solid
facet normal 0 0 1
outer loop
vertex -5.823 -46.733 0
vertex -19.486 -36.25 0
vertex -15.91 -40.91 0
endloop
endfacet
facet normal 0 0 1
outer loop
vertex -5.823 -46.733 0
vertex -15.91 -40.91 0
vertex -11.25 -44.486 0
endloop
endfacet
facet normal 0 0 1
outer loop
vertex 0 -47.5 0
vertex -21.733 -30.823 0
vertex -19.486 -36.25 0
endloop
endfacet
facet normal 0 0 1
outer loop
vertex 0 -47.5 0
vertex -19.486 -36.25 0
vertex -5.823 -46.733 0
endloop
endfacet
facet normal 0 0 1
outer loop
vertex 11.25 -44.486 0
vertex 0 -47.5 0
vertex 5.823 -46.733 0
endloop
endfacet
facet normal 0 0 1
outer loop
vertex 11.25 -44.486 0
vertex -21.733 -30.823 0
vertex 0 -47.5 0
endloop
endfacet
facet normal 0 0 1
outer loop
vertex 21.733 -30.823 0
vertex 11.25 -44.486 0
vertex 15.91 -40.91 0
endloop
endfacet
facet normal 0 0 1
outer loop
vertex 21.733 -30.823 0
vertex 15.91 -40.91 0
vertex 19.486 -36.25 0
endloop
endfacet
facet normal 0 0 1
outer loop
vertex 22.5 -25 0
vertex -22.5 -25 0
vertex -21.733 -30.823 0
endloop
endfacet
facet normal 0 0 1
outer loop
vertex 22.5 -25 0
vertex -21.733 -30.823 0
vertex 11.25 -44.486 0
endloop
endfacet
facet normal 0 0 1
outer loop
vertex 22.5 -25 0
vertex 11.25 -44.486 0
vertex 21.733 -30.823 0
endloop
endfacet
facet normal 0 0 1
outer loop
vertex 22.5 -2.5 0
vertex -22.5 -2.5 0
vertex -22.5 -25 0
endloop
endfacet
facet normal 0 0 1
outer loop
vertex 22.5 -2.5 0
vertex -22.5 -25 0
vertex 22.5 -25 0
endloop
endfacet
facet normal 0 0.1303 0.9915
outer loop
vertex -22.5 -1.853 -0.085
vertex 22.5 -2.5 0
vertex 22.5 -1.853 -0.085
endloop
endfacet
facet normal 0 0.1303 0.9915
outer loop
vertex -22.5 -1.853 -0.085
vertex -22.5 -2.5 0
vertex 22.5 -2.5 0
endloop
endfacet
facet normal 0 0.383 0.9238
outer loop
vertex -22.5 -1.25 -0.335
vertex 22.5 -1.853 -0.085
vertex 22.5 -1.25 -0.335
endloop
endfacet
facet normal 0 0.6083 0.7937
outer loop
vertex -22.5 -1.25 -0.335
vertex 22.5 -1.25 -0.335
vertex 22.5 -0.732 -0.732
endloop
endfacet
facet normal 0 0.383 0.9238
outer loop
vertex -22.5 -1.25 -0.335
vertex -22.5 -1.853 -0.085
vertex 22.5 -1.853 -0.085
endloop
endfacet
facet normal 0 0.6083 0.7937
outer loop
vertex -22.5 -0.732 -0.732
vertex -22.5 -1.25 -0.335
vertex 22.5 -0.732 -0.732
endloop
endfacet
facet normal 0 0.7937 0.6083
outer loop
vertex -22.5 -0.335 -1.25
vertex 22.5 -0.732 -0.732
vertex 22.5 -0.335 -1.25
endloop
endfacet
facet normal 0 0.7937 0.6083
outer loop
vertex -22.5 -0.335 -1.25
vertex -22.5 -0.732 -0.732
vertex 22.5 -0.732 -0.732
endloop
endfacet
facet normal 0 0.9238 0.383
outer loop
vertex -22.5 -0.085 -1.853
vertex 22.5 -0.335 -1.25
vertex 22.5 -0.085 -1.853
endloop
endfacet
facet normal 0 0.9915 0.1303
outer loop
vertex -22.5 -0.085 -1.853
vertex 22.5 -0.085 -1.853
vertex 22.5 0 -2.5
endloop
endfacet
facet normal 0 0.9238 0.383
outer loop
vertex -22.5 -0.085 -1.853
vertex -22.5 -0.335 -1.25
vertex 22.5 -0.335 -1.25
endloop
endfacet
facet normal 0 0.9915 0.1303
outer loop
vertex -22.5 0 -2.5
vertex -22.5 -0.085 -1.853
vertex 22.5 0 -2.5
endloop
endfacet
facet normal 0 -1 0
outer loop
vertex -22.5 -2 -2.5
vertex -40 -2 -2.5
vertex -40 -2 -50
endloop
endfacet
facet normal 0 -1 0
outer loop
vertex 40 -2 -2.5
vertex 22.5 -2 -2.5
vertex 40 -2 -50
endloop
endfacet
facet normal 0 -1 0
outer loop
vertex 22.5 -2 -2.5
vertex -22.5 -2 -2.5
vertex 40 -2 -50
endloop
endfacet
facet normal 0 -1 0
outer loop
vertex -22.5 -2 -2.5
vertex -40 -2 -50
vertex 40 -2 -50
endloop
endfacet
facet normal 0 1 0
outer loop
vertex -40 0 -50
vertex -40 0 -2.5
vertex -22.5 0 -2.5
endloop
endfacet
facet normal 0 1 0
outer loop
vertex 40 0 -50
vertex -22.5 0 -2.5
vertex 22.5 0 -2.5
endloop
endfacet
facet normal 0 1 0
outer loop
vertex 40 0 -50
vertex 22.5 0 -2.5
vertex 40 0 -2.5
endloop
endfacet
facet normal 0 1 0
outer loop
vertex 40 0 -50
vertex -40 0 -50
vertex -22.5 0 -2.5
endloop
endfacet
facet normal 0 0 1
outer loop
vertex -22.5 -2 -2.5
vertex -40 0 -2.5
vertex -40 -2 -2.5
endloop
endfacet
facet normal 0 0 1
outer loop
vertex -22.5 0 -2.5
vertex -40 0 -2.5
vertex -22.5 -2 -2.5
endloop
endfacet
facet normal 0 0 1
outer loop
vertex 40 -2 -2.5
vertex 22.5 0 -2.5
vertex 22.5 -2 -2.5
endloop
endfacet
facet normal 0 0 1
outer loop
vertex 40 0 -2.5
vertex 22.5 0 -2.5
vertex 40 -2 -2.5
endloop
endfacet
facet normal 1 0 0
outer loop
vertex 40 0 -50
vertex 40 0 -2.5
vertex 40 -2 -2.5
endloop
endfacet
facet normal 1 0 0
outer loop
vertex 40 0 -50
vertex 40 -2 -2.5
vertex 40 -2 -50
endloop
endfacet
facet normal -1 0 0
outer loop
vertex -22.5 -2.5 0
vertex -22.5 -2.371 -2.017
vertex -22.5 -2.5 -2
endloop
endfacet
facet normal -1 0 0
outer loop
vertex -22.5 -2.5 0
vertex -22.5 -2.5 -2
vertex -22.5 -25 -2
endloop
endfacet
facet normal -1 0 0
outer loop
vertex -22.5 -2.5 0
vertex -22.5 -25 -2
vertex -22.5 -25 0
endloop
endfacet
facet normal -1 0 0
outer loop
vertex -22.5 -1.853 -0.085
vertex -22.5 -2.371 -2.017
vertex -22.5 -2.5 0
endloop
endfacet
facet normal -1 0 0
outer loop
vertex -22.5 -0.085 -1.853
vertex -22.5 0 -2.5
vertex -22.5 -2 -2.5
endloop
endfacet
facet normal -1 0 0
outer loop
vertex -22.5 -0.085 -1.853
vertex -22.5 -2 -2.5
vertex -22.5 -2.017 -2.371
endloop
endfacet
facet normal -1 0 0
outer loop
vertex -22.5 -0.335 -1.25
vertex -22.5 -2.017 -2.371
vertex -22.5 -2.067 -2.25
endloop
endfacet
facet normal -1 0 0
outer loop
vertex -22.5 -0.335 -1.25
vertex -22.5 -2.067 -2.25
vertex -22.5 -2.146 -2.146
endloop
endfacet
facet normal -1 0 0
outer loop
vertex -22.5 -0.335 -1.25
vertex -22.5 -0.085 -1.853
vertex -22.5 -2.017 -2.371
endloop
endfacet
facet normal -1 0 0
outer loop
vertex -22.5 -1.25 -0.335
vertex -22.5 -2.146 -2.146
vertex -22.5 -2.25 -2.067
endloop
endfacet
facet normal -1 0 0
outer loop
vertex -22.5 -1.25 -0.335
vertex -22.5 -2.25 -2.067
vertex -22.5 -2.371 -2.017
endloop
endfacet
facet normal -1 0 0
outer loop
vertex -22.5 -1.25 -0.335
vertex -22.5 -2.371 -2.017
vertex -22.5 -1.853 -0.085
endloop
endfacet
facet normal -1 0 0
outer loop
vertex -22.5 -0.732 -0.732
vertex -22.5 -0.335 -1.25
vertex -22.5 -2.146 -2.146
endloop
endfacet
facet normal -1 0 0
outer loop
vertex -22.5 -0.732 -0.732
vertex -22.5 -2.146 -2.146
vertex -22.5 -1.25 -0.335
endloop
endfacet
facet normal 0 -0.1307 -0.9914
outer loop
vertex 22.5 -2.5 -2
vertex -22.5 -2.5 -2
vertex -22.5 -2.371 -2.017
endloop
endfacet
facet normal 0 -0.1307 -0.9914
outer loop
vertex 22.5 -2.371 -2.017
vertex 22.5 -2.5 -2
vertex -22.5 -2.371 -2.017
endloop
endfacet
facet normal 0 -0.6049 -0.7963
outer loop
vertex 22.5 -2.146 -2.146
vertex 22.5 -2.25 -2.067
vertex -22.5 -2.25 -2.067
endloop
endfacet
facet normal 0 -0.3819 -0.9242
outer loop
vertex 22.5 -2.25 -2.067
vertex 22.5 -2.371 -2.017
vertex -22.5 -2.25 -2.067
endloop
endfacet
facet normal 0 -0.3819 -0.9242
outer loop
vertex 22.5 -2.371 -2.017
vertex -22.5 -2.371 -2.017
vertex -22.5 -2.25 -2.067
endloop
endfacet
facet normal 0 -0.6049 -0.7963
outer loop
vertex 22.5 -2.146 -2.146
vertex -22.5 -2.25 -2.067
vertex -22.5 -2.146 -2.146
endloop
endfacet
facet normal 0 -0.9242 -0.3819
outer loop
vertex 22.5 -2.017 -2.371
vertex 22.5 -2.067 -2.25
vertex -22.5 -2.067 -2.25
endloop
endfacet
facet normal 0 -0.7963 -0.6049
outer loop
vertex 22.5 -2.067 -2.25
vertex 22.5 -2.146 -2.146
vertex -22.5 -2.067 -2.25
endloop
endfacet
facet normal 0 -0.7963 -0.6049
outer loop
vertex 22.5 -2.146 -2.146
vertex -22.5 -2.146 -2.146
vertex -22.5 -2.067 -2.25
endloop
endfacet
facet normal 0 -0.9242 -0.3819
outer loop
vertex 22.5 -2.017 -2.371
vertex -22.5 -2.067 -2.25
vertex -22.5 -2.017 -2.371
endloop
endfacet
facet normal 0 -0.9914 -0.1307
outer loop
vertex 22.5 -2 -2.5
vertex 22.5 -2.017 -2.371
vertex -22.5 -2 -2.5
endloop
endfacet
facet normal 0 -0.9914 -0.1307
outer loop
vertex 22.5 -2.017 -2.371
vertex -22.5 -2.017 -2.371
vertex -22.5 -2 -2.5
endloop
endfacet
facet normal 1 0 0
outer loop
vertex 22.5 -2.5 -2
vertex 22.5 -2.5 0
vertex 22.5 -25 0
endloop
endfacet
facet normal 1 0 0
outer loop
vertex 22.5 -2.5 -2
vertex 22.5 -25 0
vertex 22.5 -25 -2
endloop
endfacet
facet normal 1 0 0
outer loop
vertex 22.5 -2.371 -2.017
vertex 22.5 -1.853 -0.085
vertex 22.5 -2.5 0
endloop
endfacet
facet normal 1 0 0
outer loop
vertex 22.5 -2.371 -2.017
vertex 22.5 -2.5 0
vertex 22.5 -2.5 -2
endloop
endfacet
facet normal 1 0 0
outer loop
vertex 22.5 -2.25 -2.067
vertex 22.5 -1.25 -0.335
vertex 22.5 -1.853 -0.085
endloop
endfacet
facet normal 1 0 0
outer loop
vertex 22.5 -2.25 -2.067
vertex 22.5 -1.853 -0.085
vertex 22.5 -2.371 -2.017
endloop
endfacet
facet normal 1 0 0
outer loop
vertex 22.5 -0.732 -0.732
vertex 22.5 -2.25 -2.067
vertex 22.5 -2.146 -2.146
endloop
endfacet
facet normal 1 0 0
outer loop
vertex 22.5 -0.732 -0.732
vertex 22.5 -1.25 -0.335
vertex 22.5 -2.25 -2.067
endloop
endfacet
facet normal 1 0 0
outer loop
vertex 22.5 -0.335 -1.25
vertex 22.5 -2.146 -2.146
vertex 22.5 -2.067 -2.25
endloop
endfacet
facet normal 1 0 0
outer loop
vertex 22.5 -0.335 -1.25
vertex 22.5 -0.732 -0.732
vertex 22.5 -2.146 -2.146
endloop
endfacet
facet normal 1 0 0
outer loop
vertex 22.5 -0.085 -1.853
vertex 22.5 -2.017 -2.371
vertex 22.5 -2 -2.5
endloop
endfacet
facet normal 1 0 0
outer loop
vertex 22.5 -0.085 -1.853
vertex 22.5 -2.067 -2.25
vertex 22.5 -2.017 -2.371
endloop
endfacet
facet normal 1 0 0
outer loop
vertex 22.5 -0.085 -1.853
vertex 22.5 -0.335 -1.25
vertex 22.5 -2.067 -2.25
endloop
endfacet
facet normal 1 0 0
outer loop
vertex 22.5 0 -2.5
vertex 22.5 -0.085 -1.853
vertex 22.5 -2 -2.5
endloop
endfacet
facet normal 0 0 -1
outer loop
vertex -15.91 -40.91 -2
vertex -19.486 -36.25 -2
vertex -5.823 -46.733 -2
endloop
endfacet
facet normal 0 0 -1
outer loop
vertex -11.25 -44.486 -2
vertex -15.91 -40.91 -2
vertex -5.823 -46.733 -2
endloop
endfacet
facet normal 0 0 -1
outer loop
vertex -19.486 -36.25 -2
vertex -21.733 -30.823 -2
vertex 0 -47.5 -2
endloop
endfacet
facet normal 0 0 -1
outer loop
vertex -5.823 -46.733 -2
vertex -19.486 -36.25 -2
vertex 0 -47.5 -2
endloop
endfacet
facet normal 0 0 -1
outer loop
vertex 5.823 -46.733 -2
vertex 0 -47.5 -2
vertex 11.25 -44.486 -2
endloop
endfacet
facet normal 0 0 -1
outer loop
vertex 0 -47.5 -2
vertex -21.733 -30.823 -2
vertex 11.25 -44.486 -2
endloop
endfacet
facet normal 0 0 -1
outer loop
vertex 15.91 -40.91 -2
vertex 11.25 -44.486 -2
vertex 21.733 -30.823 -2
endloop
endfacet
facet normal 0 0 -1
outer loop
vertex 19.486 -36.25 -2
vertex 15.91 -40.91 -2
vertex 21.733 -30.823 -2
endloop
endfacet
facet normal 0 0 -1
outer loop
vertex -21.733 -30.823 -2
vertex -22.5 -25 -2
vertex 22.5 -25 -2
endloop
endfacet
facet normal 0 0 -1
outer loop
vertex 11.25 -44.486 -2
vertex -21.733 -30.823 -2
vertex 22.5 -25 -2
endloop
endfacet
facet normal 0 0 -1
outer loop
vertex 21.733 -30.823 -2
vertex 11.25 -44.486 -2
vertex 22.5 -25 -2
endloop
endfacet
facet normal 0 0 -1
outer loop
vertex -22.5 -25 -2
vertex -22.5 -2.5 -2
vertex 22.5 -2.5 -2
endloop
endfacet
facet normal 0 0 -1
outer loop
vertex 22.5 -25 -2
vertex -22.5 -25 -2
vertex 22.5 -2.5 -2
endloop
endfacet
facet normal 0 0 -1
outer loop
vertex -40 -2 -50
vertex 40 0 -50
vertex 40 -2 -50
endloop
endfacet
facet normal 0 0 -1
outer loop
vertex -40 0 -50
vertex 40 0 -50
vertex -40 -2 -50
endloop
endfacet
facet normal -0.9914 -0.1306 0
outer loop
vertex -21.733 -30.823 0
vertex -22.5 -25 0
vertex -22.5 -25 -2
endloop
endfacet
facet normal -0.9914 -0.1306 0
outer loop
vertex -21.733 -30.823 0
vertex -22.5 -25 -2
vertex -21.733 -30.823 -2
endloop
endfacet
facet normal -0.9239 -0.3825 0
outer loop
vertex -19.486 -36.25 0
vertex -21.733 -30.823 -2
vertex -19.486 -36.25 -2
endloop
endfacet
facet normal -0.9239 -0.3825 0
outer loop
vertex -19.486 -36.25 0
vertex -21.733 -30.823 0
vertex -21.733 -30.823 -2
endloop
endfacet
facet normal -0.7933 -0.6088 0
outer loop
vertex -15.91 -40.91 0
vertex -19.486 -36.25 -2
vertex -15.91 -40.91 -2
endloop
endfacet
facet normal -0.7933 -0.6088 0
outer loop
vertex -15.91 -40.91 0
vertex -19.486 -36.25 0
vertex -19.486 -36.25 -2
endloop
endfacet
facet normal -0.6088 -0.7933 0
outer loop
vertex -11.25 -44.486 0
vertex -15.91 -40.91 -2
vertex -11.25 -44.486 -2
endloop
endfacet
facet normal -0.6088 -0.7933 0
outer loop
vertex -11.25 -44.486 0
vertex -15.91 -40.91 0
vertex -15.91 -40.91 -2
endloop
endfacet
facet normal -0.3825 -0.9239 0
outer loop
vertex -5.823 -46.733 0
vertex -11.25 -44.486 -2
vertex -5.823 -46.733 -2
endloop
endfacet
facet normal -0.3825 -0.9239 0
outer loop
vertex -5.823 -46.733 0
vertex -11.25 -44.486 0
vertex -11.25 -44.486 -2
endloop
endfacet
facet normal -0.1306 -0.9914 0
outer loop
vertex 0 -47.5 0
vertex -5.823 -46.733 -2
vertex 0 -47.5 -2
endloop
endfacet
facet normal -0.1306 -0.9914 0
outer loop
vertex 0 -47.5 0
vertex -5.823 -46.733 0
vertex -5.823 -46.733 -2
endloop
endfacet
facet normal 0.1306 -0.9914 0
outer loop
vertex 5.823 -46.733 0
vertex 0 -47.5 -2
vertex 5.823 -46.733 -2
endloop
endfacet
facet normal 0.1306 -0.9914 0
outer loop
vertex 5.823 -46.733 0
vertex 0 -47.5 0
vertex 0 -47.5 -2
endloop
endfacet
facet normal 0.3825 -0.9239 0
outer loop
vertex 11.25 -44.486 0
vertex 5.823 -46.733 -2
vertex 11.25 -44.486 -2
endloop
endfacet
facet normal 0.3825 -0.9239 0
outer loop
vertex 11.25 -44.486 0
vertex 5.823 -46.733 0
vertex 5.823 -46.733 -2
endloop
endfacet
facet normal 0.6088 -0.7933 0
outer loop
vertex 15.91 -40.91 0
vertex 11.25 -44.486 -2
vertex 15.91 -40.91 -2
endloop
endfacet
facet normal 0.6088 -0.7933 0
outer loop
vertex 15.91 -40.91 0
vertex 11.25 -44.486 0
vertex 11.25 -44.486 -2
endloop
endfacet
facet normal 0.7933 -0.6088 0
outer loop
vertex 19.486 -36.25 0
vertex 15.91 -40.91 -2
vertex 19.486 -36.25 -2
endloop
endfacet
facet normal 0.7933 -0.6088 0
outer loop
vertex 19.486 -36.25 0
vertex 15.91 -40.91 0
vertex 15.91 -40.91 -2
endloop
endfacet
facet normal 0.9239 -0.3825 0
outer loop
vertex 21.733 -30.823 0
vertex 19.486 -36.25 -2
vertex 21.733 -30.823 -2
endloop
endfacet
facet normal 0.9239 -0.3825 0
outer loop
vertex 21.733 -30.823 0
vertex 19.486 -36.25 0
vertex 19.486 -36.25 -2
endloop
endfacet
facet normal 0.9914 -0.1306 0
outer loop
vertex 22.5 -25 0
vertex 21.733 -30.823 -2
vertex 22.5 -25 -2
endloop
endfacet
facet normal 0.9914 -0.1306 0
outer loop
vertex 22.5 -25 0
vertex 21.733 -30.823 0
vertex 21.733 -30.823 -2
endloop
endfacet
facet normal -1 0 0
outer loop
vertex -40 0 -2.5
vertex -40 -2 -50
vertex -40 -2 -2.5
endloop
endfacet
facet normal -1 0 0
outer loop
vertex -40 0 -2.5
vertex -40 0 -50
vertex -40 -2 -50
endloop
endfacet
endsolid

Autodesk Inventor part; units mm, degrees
ref_plane "Work Plane1" through (0, -25, -17) normal (0, 0, 1) x (1, 0, 0)
ref_plane "YZ Plane" through (0, 0, 0) normal (1, 0, 0) x (0, 1, 0)
ref_plane "XZ Plane" through (0, 0, 0) normal (0, 1, 0) x (-1, 0, 0)
sketch "Sketch2" plane through (0, 0, 0) normal (0, 1, 0) x (-1, 0, 0)
  line L0 (22.5, 0) -> (-22.5, 0)
  line L1 (-22.5, 0) -> (-22.5, -50)
  line L2 (-22.5, -50) -> (22.5, -50)
  line L3 (22.5, -50) -> (22.5, 0)
  point P0 (0, 0)
  point P1 (0, 0)
  dimension "d4" = 50
  dimension "d5" = 45
extrude "Extrusion1" add sketch "Sketch2" against normal blind 2
sketch "Sketch3" plane through (0, 0, 0) normal (0, 0, 1) x (1, 0, 0)
  circle A0 centre (0, -25) radius 15.5
  arc A1 (-22.5, -25) -> (22.5, -25) centre (0, -25) ccw projected
  point P0 (0, 0)
  point P1 (-15.5, -25)
  point P2 (15.5, -25)
  point P3 (-7.75, -11.5766)
  point P4 (7.75, -38.4234)
  point P5 (-7.75, -38.4234)
  point P6 (7.75, -11.5766)
  dimension "d14" = 31
  dimension "d17" = 360
sketch "Sketch4" plane through (0, 0, 0) normal (0, 1, 0) x (1, 0, 0)
  line L0 (-34.5, 43) -> (34.5, 43) construction
  line L1 (34.5, 43) -> (34.5, 9) construction
  line L2 (34.5, 9) -> (-34.5, 9) construction
  line L3 (-34.5, 9) -> (-34.5, 43) construction
  line L4 (22.5, 50) -> (-22.5, 50) construction
  point P0 (0, 0)
  point P1 (0, 43)
  point P2 (0, 50)
  dimension "d26" = 34
  dimension "d27" = 69
  dimension "d36" = 7
sketch "Sketch6" plane through (0, 0, 0) normal (0, 0, 1) x (1, 0, 0)
  line L0 (0, -23) -> (0, -25) construction
  line L1 (-12.5, -23) -> (-12.5, -25)
  line L2 (12.5, -25) -> (12.5, -23)
  arc A0 (12.5, -23) -> (-12.5, -23) centre (0, -23) ccw
  arc A1 (-12.5, -25) -> (12.5, -25) centre (0, -25) ccw
  arc A2 (-22.5, -25) -> (22.5, -25) centre (0, -25) ccw projected
  point P0 (0, 0)
  point P1 (0, -24)
  dimension "d45" = 25
  dimension "d46" = 2
sketch "Sketch10" plane through (0, -25, -17) normal (0, 0, 1) x (1, 0, 0)
  arc A0 (-12.5, 0) -> (12.5, 0) centre (0, 0) ccw projected
  circle A1 centre (0, 0) radius 19
  line L0 (0, 0) -> (0, 23) construction
  line L1 (22.5, 23) -> (-22.5, 23) projected
  line L2 (-22.5, 0) -> (-22.5, 23)
  line L3 (22.5, 23) -> (22.5, 0)
  arc A2 (-22.5, 0) -> (22.5, 0) centre (0, 0) ccw
  arc A3 (22.5, 23) -> (-22.5, 23) centre (0, 23) ccw construction
  arc A4 (-22.5, 0) -> (22.5, 0) centre (0, 0) ccw projected
  line L4 (37, 23) -> (-37, 23) projected
  point P0 (19.5, 23)
  point P1 (-19.5, 23)
  point P2 (0, 11.5)
  dimension "d69" = 38
sketch "Sketch12" plane through (-22.5, -25, -2) normal (-1, 0, 0) x (0, 0, 1)
  line L0 (3, 22.5) -> (3, 0) projected
  line L1 (3, 11) -> (-20, 11)
  line L2 (-20, 11) -> (-34, 23)
  line L3 (-45, 23) -> (-3.5, 23) projected
  line L4 (-20, 0) -> (-20, 23) projected
  line L5 (-15, 23) -> (-15, 0) projected
  line L6 (0, 22.5) -> (0, 0) projected
  line L7 (0, 22.5) -> (0, 23)
  line L8 (0, 23) -> (-3.5, 23)
  point P0 (2, 25)
  point P1 (-15, 11)
  point P2 (0, 11)
  dimension "d72" = 12
  dimension "d73" = 14
sketch "Sketch1" plane through (0, 0, 0) normal (0, 0, 1) x (1, 0, 0)
  line L0 (0, 0) -> (0, -25) construction
  line L1 (-22.5, 0) -> (-22.5, -25)
  line L2 (22.5, -25) -> (22.5, 0)
  arc A0 (22.5, 0) -> (-22.5, 0) centre (0, 0) ccw construction
  arc A1 (-22.5, -25) -> (22.5, -25) centre (0, -25) ccw
  circle A2 centre (0, -25) radius 18.5 construction
  line L3 (22.5, 0) -> (-22.5, 0)
  line L4 (22.5, 0) -> (22.5, -2)
  line L5 (22.5, -2) -> (-22.5, -2)
  line L6 (-22.5, -2) -> (-22.5, 0)
  line L7 (-22.5, 0) -> (22.5, 0)
  point P0 (0, -12.5)
  point P1 (0, -6.5)
  dimension "d1" = 37
  dimension "d3" = 6.5
sheet face with bend "Face1" sketch "Sketch1" thickness 2 toward (0, 0, -1) bend radius 0.5 contours L5 L2 A1 L1
bend "Bend1"
sketch "Sketch8" plane through (0, 0, 0) normal (0, 1, 0) x (1, 0, 0)
  line L0 (-40, 2.5) -> (40, 2.5)
  line L1 (40, 2.5) -> (40, 50)
  line L2 (40, 50) -> (-40, 50)
  line L3 (-40, 50) -> (-40, 2.5)
  line L4 (-40, 2.5) -> (40, 50) construction
  line L5 (40, 2.5) -> (-40, 50) construction
  line L6 (22.5, 50) -> (-22.5, 50) projected
  line L7 (-22.5, 2.5) -> (22.5, 2.5) projected
  point P0 (0, 0)
  point P1 (0, 26.25)
  point P2 (0, 26.25)
  dimension "d50" = 80
extrude "Extrusion3" add sketch "Sketch8" against normal up to surface (2 mm away)
equation "\"d8\" = Thickness"
equation "\"d10\" = BendReliefWidth"
equation "\"d12\" = MinimumRemnant"
equation "\"d11\" = BendReliefDepth"
equation "\"d13\" = TransitionRadius"
equation "\"BendRadius\" = Thickness"
equation "\"BendReliefWidth\" = Thickness"
equation "\"BendReliefDepth\" = 0.5 * Thickness"
equation "\"CornerReliefSize\" = 4 * Thickness"
equation "\"MinimumRemnant\" = 2 * Thickness"
equation "\"TransitionRadius\" = BendRadius"
equation "\"JacobiRadiusSize\" = BendRadius"
equation "\"GapSize\" = Thickness"
equation "\"Thickness\" = 2"
properties part number "12v DC motor mount (3D printed)"
